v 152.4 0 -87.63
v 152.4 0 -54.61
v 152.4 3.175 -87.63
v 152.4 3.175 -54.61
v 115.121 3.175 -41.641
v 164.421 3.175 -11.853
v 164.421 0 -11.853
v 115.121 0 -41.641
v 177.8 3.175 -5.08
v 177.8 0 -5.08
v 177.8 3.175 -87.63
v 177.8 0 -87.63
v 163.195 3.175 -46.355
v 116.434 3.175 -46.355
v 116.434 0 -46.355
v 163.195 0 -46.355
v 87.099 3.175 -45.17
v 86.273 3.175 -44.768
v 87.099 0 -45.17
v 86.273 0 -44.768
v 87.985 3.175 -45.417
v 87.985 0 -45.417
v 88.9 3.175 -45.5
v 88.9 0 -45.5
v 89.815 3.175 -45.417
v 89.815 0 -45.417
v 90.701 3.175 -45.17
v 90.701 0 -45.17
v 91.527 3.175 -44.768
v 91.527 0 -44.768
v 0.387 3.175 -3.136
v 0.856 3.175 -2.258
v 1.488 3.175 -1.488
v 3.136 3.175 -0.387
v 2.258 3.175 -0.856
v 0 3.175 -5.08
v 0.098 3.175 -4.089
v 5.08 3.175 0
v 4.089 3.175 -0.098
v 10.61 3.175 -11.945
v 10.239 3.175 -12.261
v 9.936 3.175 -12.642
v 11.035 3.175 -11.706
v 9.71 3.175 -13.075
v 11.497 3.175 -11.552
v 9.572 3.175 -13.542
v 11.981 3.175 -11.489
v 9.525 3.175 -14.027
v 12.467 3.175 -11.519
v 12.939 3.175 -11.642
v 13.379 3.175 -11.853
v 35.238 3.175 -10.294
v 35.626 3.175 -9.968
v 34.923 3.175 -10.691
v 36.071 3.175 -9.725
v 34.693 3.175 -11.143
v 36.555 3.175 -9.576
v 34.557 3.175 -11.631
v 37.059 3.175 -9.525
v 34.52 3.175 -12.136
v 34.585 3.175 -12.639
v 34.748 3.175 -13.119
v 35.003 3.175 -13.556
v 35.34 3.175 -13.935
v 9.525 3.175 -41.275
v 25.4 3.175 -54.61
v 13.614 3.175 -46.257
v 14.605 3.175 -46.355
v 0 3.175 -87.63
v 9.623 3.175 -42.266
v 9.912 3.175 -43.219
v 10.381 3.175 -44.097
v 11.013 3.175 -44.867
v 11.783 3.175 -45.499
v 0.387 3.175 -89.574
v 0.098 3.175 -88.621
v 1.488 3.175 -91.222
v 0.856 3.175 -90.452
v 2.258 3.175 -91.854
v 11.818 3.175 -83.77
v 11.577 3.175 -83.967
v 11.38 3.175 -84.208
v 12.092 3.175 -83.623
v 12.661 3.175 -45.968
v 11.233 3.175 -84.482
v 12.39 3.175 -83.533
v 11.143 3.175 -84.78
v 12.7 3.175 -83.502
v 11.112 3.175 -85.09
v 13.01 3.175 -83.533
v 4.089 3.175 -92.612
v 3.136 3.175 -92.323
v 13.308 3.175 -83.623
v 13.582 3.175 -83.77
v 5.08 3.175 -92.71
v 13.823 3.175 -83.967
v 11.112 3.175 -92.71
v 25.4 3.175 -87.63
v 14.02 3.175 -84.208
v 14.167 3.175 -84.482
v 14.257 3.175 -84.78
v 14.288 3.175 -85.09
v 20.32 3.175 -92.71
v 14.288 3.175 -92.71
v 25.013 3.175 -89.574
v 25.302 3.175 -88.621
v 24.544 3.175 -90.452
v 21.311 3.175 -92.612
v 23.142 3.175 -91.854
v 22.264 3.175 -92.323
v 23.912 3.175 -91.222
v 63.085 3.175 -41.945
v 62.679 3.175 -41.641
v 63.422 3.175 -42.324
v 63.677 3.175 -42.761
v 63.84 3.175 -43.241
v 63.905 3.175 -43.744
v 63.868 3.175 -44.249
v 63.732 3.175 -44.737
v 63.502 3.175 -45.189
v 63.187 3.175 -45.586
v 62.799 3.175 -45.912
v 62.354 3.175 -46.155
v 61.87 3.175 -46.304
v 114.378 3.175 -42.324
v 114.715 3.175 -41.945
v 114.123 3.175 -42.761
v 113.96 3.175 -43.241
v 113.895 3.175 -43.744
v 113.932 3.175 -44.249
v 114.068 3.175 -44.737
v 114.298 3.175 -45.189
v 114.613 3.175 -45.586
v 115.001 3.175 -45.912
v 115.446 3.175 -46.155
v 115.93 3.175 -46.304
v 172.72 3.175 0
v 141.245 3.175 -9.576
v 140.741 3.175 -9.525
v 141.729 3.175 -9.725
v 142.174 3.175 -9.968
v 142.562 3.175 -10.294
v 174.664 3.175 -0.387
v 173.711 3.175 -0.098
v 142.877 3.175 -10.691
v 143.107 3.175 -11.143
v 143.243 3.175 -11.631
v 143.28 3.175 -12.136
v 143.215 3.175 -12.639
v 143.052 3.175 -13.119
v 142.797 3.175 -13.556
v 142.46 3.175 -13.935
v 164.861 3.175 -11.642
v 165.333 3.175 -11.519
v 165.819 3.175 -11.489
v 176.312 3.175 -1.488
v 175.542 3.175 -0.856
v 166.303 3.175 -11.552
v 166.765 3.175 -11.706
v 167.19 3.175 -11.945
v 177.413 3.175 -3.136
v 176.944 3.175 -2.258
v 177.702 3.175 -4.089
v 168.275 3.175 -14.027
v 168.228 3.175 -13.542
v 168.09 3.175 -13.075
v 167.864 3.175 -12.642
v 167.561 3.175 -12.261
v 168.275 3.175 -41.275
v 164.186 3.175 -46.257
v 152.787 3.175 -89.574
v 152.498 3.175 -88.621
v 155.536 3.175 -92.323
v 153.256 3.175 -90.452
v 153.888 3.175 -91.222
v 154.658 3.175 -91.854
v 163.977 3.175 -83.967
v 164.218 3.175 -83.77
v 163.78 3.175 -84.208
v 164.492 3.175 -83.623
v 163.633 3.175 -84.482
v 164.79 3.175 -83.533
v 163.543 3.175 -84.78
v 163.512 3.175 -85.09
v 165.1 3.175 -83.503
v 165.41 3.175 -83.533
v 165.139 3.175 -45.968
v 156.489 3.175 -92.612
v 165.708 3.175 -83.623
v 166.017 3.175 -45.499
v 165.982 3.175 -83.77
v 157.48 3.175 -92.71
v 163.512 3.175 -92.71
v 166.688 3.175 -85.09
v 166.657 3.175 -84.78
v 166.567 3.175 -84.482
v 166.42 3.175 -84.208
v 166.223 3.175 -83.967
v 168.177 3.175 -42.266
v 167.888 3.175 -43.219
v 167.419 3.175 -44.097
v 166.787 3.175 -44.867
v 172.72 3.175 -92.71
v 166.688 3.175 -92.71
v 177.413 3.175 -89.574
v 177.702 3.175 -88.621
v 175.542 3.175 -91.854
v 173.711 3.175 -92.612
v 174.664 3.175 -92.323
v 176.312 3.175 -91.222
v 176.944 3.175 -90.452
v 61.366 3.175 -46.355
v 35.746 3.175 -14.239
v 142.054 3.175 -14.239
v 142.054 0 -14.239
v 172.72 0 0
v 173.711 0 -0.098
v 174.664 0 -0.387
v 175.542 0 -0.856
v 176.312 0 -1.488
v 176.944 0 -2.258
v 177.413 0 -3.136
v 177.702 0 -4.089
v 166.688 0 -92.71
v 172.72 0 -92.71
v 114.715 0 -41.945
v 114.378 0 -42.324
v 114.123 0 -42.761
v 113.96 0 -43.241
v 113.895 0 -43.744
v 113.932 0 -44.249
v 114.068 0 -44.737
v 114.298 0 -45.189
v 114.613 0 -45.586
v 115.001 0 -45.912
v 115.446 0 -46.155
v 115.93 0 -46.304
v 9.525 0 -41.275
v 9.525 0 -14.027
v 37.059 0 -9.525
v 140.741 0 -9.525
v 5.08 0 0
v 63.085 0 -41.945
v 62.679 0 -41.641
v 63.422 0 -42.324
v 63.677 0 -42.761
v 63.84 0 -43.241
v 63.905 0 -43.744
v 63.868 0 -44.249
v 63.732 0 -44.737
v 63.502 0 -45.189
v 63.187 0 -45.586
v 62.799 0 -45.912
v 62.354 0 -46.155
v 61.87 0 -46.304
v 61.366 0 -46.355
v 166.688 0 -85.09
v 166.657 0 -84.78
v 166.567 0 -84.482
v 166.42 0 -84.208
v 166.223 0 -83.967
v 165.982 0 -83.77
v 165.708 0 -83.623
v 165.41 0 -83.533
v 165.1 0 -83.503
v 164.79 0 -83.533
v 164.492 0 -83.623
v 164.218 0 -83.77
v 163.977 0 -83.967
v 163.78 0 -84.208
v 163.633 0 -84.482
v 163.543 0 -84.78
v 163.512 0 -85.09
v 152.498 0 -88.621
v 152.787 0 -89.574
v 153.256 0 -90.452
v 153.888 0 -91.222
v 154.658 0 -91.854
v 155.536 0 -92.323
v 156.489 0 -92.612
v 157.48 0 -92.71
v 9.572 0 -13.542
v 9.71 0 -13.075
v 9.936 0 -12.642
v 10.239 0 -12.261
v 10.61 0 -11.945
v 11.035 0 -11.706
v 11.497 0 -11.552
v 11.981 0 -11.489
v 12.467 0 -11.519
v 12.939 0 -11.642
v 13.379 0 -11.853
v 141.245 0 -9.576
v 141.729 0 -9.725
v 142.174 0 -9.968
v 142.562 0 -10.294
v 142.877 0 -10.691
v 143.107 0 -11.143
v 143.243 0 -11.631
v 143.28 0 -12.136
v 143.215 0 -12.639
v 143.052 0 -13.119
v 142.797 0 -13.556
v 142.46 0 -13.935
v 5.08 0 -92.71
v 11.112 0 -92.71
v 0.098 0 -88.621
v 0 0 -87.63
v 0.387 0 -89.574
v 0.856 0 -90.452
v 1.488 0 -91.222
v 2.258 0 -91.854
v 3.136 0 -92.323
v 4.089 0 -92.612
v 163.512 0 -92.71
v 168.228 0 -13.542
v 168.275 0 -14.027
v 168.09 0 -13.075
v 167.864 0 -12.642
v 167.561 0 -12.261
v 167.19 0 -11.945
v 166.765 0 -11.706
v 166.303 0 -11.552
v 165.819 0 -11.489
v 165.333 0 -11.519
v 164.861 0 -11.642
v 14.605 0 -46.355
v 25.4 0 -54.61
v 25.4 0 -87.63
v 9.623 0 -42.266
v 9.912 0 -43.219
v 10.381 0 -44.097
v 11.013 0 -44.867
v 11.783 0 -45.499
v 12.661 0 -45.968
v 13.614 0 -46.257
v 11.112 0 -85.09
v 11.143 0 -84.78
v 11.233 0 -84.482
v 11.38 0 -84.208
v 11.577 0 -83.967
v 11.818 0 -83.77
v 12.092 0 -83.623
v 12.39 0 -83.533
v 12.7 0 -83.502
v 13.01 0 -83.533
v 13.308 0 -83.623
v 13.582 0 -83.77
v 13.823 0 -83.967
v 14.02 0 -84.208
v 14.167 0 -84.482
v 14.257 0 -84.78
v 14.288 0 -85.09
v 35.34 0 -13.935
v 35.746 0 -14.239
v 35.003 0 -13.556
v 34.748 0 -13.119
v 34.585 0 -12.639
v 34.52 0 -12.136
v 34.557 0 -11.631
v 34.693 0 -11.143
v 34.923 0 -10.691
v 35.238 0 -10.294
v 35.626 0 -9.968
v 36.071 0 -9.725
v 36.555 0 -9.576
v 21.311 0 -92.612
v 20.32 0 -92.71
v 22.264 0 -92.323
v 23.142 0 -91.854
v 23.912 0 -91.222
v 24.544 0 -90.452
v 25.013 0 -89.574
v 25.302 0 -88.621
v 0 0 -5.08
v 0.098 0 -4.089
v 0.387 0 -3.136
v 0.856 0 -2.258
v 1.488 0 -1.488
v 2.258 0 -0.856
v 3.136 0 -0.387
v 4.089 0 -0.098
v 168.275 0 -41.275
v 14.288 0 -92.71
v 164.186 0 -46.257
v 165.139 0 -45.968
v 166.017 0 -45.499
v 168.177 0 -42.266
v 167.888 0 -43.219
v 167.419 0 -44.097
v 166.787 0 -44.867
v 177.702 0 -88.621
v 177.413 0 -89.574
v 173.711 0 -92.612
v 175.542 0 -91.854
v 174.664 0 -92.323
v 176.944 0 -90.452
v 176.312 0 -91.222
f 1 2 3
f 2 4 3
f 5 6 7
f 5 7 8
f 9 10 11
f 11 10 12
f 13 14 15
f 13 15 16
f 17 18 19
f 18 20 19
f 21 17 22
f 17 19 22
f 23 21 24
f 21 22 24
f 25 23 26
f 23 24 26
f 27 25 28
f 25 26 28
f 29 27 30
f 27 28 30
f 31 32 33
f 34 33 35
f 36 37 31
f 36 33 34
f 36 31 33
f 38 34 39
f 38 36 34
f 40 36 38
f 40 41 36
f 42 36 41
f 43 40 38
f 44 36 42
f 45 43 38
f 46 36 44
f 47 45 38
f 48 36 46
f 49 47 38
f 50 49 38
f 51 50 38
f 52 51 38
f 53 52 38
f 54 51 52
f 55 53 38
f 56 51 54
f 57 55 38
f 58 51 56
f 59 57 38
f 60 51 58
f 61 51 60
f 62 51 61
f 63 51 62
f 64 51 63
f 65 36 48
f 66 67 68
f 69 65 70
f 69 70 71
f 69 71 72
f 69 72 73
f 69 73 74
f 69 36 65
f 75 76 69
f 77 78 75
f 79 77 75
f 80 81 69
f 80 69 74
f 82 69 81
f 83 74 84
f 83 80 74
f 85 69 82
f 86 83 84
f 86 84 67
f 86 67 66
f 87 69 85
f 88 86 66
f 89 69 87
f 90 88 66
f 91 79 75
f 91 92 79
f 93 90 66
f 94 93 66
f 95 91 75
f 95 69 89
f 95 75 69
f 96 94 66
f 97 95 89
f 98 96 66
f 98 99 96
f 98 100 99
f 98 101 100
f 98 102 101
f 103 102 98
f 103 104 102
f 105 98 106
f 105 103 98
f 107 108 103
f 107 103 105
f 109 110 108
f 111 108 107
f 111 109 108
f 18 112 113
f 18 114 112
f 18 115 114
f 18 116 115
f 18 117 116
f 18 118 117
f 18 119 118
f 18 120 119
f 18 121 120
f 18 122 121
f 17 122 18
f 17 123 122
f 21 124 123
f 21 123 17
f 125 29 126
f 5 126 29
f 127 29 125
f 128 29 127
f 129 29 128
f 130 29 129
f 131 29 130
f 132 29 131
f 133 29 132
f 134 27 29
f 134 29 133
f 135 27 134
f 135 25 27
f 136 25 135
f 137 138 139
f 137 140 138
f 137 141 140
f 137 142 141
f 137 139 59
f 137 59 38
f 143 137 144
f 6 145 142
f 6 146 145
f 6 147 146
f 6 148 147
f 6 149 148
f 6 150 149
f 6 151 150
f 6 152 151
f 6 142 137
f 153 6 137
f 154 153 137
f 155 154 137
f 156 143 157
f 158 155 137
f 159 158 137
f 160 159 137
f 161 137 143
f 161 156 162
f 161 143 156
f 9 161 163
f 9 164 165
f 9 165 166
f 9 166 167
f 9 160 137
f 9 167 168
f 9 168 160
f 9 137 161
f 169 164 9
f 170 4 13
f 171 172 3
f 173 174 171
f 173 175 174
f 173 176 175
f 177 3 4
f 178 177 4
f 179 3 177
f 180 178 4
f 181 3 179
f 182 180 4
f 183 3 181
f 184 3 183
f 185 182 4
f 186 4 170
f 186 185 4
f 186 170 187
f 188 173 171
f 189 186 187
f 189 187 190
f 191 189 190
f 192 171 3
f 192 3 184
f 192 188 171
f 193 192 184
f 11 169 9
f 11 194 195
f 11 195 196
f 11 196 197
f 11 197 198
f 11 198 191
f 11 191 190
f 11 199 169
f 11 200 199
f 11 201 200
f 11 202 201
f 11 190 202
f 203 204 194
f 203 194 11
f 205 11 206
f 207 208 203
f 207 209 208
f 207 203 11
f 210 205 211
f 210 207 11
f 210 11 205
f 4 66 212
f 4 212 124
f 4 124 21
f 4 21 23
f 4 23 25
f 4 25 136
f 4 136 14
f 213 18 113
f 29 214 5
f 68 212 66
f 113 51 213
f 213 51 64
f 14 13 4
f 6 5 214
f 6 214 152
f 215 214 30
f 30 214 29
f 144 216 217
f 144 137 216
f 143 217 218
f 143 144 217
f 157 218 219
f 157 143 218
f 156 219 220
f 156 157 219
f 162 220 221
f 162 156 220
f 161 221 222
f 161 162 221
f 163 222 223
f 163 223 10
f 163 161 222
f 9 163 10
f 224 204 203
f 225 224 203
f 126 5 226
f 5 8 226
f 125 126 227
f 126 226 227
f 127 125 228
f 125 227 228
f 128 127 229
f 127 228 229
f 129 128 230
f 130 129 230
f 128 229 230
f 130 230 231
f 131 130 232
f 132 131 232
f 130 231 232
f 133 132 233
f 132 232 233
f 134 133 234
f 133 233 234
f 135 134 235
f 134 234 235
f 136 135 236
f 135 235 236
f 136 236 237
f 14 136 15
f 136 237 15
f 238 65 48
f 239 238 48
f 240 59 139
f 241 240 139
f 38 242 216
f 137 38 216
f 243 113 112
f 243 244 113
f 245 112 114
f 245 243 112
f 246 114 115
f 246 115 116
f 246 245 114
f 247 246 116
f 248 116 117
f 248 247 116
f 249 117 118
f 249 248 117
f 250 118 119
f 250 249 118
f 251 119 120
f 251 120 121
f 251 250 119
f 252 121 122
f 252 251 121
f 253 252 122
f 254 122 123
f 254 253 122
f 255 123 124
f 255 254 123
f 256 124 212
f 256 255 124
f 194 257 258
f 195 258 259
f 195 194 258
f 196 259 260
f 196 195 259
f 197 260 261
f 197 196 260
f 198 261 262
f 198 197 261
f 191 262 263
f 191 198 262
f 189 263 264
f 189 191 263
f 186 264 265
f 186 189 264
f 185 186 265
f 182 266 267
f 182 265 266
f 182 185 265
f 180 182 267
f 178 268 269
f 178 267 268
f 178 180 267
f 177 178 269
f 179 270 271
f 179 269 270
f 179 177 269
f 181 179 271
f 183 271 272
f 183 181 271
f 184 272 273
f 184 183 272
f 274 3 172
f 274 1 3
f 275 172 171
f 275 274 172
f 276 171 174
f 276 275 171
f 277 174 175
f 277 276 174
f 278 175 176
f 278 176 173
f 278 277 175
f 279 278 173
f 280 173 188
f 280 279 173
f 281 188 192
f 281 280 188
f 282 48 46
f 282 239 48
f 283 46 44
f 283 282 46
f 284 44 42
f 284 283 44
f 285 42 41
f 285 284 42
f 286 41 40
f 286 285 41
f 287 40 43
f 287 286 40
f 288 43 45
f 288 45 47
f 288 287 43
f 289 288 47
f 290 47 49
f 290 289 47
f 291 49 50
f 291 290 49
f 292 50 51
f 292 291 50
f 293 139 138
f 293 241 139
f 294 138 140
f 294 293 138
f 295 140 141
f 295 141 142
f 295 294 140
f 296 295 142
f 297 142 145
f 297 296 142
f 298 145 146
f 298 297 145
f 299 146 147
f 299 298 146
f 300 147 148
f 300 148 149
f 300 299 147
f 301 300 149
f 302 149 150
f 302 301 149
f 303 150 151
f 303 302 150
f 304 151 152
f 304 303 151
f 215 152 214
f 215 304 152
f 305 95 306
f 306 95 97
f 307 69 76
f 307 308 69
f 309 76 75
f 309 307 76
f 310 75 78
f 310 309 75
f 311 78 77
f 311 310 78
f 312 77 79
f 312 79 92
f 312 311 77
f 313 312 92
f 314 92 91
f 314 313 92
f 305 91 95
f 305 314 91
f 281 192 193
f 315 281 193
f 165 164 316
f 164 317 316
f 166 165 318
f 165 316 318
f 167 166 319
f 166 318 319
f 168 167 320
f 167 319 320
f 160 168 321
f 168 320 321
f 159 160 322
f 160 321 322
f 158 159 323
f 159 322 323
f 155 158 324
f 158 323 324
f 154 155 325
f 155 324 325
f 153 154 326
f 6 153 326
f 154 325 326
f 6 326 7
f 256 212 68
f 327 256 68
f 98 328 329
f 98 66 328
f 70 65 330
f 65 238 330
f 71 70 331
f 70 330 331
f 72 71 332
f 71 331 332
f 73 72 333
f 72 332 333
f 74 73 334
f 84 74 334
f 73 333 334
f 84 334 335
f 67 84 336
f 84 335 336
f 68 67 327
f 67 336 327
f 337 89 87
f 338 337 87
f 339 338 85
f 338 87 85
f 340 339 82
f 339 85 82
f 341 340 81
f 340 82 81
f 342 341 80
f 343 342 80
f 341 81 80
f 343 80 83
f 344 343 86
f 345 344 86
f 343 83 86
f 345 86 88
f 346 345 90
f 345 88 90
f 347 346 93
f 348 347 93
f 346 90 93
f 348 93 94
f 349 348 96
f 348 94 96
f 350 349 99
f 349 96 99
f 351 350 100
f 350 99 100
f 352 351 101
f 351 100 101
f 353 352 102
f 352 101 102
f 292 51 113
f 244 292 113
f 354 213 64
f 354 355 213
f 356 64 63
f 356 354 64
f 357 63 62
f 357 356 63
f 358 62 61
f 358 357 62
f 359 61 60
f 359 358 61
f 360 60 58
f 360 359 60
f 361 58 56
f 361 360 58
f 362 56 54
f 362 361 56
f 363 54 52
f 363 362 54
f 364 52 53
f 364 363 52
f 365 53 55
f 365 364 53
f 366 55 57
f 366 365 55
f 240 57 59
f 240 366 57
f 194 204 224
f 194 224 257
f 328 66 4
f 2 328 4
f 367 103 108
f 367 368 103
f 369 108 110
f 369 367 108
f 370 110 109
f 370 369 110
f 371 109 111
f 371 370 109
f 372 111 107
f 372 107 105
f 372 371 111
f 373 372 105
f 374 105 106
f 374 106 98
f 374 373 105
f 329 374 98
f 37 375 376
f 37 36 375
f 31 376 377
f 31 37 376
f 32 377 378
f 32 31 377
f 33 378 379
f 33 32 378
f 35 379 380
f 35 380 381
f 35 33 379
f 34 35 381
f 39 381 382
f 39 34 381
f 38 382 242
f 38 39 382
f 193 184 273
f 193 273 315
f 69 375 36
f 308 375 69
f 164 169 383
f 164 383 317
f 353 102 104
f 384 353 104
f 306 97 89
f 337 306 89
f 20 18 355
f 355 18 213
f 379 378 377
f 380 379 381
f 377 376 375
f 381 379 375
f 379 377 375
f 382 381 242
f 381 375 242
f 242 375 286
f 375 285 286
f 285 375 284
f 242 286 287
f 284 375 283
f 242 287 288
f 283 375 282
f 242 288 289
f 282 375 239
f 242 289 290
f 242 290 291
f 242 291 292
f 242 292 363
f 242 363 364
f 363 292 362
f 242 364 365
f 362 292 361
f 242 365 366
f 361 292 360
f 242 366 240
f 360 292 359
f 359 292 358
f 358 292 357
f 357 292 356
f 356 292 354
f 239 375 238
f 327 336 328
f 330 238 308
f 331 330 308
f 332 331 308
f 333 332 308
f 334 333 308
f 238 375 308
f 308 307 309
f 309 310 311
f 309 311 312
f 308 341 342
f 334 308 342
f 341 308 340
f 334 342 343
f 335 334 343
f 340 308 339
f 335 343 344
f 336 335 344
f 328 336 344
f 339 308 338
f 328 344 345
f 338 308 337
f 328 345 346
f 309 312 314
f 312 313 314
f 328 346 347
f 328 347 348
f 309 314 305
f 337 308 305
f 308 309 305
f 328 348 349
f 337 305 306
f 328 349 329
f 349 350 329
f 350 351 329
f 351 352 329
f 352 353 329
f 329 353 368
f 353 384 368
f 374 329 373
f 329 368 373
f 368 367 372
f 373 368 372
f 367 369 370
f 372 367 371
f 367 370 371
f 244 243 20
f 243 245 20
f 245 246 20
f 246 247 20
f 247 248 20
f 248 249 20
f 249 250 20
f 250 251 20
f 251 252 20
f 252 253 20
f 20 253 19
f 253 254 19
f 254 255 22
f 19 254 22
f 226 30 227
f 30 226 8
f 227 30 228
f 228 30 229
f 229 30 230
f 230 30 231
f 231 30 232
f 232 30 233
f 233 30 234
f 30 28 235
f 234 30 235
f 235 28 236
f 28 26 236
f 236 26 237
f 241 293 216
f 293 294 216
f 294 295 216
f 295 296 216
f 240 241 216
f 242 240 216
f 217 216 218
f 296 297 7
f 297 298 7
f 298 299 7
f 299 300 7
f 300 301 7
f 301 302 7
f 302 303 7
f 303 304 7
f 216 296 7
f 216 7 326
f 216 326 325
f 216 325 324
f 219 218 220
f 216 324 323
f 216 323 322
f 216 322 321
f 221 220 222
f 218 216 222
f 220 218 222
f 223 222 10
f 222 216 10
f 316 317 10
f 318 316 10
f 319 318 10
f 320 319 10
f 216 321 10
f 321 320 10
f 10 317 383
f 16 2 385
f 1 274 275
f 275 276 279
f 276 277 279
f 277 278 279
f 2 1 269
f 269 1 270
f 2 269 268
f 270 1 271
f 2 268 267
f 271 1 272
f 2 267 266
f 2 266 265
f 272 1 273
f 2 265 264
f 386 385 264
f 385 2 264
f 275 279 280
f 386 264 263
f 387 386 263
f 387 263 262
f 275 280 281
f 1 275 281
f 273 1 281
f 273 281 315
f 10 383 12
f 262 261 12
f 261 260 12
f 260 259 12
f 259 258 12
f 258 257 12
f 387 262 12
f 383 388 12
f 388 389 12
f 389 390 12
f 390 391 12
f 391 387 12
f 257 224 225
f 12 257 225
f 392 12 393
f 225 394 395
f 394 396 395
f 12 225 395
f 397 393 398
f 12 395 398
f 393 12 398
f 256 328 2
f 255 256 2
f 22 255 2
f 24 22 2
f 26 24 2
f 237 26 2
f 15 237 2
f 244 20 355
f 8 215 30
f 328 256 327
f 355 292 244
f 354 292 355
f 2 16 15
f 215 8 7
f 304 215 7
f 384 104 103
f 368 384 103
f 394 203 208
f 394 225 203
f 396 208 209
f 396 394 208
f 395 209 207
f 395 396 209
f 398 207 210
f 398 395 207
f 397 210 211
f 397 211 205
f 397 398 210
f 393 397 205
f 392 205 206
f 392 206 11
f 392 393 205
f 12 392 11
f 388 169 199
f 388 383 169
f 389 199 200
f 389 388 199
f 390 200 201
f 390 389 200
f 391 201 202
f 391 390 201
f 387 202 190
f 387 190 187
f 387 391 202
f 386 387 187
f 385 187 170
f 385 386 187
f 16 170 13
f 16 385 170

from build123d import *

# Parameters (mm, degrees)
SKETCH1_W           = 177.8
SKETCH1_H           = 67.31
BOSS_EXTRUDE1_DEPTH = 3.175
CUT_EXTRUDE1_DEPTH  = 4.175
CUT_EXTRUDE2_DEPTH  = 4.175
SKETCH5_W           = 127
SKETCH5_H           = 12.7
CUT_EXTRUDE3_DEPTH  = 4.175
FILLET1_R           = 5.08
FILLET2_R           = 2.54
SKETCH7_W           = 25.4
SKETCH7_H           = 38.1
BOSS_EXTRUDE2_DEPTH = 3.175
CUT_EXTRUDE4_DEPTH  = 4.175
FILLET3_R           = 5.08


with BuildPart() as part:
    # Sketch1 → Boss-Extrude1 (new body)
    with BuildSketch(Plane(origin=(0, 0, 0), x_dir=(1, 0, 0), z_dir=(0, 1, 0))):
        with Locations((88.9, 33.655)):
            Rectangle(SKETCH1_W, SKETCH1_H)
    extrude(amount=BOSS_EXTRUDE1_DEPTH)

    # Sketch3 → Cut-Extrude1 (cut, through all)
    with BuildSketch(Plane(origin=(0, 3.175, 0), x_dir=(1, 0, 0), z_dir=(0, 1, 0))):
        Polygon((88.9, 46.355), (27.943666175, 9.525), (149.856333825, 9.525), align=None)
        Polygon((9.525, 46.355), (9.525, 9.525), (70.481333825, 46.355), align=None)
        Polygon((168.275, 9.525), (107.318666175, 46.355), (168.275, 46.355), align=None)
    extrude(amount=-CUT_EXTRUDE1_DEPTH, mode=Mode.SUBTRACT)

    # Sketch4 → Cut-Extrude2 (cut, through all)
    with BuildSketch(Plane(origin=(0, 3.175, 0), x_dir=(1, 0, 0), z_dir=(0, 1, 0))):
        with BuildLine():
            Line((11.1125, 67.31), (11.1125, 62.23))
            ThreePointArc((11.1125, 62.23), (12.7, 60.6425), (14.2875, 62.23))
            Line((14.2875, 62.23), (14.2875, 67.31))
            Line((14.2875, 67.31), (11.1125, 67.31))
        make_face()
        with BuildLine():
            Line((166.6875, 67.31), (166.6875, 62.23))
            ThreePointArc((166.6875, 62.23), (165.1, 60.6425), (163.5125, 62.23))
            Line((163.5125, 62.23), (163.5125, 67.31))
            Line((163.5125, 67.31), (166.6875, 67.31))
        make_face()
    extrude(amount=-CUT_EXTRUDE2_DEPTH, mode=Mode.SUBTRACT)

    # Sketch5 → Cut-Extrude3 (cut, through all)
    with BuildSketch(Plane(origin=(0, 3.175, 0), x_dir=(1, 0, 0), z_dir=(0, 1, 0))):
        with Locations((88.9, 60.96)):
            Rectangle(SKETCH5_W, SKETCH5_H)
    extrude(amount=-CUT_EXTRUDE3_DEPTH, mode=Mode.SUBTRACT)

    # Fillet1
    fillet1_edges = [part.edges().sort_by_distance(p)[0] for p in [
        (88.9, 1.5875, -46.355),
        (9.525, 1.5875, -46.355),
        (168.275, 1.5875, -46.355),
        (0, 1.5875, -67.31),
        (177.8, 1.5875, -67.31),
        (177.8, 1.5875, 0),
        (0, 1.5875, 0),
        (25.4, 1.5875, -67.31),
        (152.4, 1.5875, -67.31),
    ]]
    fillet(fillet1_edges, radius=FILLET1_R)

    # Fillet2
    fillet2_edges = [part.edges().sort_by_distance(p)[0] for p in [
        (149.856333825, 1.5875, -9.525),
        (27.943666175, 1.5875, -9.525),
        (70.481333825, 1.5875, -46.355),
        (9.525, 1.5875, -9.525),
        (168.275, 1.5875, -9.525),
        (107.318666175, 1.5875, -46.355),
    ]]
    fillet(fillet2_edges, radius=FILLET2_R)

    # Sketch7 → Boss-Extrude2 (add)
    with BuildSketch(Plane(origin=(0, 3.175, 0), x_dir=(1, 0, 0), z_dir=(0, 1, 0))):
        with Locations((12.7, 73.66)):
            Rectangle(SKETCH7_W, SKETCH7_H)
        with Locations((165.1, 73.66)):
            Rectangle(SKETCH7_W, SKETCH7_H)
    extrude(amount=-BOSS_EXTRUDE2_DEPTH)

    # Sketch8 → Cut-Extrude4 (cut, through all)
    with BuildSketch(Plane(origin=(0, 3.175, 0), x_dir=(1, 0, 0), z_dir=(0, 1, 0))):
        with BuildLine():
            Line((11.1125, 92.71), (11.1125, 85.09))
            ThreePointArc((11.1125, 85.09), (12.7, 83.5025), (14.2875, 85.09))
            Line((14.2875, 85.09), (14.2875, 92.71))
            Line((14.2875, 92.71), (11.1125, 92.71))
        make_face()
        with BuildLine():
            Line((163.5125, 85.09), (163.5125, 92.71))
            Line((163.5125, 92.71), (166.6875, 92.71))
            Line((166.6875, 92.71), (166.6875, 85.09))
            ThreePointArc((166.6875, 85.09), (165.1, 83.5025), (163.5125, 85.09))
        make_face()
    extrude(amount=-CUT_EXTRUDE4_DEPTH, mode=Mode.SUBTRACT)

    # Fillet3
    fillet3_edges = [part.edges().sort_by_distance(p)[0] for p in [
        (25.4, 1.5875, -92.71),
        (0, 1.5875, -92.71),
        (177.8, 1.5875, -92.71),
        (152.4, 1.5875, -92.71),
    ]]
    fillet(fillet3_edges, radius=FILLET3_R)


solid = part.part
